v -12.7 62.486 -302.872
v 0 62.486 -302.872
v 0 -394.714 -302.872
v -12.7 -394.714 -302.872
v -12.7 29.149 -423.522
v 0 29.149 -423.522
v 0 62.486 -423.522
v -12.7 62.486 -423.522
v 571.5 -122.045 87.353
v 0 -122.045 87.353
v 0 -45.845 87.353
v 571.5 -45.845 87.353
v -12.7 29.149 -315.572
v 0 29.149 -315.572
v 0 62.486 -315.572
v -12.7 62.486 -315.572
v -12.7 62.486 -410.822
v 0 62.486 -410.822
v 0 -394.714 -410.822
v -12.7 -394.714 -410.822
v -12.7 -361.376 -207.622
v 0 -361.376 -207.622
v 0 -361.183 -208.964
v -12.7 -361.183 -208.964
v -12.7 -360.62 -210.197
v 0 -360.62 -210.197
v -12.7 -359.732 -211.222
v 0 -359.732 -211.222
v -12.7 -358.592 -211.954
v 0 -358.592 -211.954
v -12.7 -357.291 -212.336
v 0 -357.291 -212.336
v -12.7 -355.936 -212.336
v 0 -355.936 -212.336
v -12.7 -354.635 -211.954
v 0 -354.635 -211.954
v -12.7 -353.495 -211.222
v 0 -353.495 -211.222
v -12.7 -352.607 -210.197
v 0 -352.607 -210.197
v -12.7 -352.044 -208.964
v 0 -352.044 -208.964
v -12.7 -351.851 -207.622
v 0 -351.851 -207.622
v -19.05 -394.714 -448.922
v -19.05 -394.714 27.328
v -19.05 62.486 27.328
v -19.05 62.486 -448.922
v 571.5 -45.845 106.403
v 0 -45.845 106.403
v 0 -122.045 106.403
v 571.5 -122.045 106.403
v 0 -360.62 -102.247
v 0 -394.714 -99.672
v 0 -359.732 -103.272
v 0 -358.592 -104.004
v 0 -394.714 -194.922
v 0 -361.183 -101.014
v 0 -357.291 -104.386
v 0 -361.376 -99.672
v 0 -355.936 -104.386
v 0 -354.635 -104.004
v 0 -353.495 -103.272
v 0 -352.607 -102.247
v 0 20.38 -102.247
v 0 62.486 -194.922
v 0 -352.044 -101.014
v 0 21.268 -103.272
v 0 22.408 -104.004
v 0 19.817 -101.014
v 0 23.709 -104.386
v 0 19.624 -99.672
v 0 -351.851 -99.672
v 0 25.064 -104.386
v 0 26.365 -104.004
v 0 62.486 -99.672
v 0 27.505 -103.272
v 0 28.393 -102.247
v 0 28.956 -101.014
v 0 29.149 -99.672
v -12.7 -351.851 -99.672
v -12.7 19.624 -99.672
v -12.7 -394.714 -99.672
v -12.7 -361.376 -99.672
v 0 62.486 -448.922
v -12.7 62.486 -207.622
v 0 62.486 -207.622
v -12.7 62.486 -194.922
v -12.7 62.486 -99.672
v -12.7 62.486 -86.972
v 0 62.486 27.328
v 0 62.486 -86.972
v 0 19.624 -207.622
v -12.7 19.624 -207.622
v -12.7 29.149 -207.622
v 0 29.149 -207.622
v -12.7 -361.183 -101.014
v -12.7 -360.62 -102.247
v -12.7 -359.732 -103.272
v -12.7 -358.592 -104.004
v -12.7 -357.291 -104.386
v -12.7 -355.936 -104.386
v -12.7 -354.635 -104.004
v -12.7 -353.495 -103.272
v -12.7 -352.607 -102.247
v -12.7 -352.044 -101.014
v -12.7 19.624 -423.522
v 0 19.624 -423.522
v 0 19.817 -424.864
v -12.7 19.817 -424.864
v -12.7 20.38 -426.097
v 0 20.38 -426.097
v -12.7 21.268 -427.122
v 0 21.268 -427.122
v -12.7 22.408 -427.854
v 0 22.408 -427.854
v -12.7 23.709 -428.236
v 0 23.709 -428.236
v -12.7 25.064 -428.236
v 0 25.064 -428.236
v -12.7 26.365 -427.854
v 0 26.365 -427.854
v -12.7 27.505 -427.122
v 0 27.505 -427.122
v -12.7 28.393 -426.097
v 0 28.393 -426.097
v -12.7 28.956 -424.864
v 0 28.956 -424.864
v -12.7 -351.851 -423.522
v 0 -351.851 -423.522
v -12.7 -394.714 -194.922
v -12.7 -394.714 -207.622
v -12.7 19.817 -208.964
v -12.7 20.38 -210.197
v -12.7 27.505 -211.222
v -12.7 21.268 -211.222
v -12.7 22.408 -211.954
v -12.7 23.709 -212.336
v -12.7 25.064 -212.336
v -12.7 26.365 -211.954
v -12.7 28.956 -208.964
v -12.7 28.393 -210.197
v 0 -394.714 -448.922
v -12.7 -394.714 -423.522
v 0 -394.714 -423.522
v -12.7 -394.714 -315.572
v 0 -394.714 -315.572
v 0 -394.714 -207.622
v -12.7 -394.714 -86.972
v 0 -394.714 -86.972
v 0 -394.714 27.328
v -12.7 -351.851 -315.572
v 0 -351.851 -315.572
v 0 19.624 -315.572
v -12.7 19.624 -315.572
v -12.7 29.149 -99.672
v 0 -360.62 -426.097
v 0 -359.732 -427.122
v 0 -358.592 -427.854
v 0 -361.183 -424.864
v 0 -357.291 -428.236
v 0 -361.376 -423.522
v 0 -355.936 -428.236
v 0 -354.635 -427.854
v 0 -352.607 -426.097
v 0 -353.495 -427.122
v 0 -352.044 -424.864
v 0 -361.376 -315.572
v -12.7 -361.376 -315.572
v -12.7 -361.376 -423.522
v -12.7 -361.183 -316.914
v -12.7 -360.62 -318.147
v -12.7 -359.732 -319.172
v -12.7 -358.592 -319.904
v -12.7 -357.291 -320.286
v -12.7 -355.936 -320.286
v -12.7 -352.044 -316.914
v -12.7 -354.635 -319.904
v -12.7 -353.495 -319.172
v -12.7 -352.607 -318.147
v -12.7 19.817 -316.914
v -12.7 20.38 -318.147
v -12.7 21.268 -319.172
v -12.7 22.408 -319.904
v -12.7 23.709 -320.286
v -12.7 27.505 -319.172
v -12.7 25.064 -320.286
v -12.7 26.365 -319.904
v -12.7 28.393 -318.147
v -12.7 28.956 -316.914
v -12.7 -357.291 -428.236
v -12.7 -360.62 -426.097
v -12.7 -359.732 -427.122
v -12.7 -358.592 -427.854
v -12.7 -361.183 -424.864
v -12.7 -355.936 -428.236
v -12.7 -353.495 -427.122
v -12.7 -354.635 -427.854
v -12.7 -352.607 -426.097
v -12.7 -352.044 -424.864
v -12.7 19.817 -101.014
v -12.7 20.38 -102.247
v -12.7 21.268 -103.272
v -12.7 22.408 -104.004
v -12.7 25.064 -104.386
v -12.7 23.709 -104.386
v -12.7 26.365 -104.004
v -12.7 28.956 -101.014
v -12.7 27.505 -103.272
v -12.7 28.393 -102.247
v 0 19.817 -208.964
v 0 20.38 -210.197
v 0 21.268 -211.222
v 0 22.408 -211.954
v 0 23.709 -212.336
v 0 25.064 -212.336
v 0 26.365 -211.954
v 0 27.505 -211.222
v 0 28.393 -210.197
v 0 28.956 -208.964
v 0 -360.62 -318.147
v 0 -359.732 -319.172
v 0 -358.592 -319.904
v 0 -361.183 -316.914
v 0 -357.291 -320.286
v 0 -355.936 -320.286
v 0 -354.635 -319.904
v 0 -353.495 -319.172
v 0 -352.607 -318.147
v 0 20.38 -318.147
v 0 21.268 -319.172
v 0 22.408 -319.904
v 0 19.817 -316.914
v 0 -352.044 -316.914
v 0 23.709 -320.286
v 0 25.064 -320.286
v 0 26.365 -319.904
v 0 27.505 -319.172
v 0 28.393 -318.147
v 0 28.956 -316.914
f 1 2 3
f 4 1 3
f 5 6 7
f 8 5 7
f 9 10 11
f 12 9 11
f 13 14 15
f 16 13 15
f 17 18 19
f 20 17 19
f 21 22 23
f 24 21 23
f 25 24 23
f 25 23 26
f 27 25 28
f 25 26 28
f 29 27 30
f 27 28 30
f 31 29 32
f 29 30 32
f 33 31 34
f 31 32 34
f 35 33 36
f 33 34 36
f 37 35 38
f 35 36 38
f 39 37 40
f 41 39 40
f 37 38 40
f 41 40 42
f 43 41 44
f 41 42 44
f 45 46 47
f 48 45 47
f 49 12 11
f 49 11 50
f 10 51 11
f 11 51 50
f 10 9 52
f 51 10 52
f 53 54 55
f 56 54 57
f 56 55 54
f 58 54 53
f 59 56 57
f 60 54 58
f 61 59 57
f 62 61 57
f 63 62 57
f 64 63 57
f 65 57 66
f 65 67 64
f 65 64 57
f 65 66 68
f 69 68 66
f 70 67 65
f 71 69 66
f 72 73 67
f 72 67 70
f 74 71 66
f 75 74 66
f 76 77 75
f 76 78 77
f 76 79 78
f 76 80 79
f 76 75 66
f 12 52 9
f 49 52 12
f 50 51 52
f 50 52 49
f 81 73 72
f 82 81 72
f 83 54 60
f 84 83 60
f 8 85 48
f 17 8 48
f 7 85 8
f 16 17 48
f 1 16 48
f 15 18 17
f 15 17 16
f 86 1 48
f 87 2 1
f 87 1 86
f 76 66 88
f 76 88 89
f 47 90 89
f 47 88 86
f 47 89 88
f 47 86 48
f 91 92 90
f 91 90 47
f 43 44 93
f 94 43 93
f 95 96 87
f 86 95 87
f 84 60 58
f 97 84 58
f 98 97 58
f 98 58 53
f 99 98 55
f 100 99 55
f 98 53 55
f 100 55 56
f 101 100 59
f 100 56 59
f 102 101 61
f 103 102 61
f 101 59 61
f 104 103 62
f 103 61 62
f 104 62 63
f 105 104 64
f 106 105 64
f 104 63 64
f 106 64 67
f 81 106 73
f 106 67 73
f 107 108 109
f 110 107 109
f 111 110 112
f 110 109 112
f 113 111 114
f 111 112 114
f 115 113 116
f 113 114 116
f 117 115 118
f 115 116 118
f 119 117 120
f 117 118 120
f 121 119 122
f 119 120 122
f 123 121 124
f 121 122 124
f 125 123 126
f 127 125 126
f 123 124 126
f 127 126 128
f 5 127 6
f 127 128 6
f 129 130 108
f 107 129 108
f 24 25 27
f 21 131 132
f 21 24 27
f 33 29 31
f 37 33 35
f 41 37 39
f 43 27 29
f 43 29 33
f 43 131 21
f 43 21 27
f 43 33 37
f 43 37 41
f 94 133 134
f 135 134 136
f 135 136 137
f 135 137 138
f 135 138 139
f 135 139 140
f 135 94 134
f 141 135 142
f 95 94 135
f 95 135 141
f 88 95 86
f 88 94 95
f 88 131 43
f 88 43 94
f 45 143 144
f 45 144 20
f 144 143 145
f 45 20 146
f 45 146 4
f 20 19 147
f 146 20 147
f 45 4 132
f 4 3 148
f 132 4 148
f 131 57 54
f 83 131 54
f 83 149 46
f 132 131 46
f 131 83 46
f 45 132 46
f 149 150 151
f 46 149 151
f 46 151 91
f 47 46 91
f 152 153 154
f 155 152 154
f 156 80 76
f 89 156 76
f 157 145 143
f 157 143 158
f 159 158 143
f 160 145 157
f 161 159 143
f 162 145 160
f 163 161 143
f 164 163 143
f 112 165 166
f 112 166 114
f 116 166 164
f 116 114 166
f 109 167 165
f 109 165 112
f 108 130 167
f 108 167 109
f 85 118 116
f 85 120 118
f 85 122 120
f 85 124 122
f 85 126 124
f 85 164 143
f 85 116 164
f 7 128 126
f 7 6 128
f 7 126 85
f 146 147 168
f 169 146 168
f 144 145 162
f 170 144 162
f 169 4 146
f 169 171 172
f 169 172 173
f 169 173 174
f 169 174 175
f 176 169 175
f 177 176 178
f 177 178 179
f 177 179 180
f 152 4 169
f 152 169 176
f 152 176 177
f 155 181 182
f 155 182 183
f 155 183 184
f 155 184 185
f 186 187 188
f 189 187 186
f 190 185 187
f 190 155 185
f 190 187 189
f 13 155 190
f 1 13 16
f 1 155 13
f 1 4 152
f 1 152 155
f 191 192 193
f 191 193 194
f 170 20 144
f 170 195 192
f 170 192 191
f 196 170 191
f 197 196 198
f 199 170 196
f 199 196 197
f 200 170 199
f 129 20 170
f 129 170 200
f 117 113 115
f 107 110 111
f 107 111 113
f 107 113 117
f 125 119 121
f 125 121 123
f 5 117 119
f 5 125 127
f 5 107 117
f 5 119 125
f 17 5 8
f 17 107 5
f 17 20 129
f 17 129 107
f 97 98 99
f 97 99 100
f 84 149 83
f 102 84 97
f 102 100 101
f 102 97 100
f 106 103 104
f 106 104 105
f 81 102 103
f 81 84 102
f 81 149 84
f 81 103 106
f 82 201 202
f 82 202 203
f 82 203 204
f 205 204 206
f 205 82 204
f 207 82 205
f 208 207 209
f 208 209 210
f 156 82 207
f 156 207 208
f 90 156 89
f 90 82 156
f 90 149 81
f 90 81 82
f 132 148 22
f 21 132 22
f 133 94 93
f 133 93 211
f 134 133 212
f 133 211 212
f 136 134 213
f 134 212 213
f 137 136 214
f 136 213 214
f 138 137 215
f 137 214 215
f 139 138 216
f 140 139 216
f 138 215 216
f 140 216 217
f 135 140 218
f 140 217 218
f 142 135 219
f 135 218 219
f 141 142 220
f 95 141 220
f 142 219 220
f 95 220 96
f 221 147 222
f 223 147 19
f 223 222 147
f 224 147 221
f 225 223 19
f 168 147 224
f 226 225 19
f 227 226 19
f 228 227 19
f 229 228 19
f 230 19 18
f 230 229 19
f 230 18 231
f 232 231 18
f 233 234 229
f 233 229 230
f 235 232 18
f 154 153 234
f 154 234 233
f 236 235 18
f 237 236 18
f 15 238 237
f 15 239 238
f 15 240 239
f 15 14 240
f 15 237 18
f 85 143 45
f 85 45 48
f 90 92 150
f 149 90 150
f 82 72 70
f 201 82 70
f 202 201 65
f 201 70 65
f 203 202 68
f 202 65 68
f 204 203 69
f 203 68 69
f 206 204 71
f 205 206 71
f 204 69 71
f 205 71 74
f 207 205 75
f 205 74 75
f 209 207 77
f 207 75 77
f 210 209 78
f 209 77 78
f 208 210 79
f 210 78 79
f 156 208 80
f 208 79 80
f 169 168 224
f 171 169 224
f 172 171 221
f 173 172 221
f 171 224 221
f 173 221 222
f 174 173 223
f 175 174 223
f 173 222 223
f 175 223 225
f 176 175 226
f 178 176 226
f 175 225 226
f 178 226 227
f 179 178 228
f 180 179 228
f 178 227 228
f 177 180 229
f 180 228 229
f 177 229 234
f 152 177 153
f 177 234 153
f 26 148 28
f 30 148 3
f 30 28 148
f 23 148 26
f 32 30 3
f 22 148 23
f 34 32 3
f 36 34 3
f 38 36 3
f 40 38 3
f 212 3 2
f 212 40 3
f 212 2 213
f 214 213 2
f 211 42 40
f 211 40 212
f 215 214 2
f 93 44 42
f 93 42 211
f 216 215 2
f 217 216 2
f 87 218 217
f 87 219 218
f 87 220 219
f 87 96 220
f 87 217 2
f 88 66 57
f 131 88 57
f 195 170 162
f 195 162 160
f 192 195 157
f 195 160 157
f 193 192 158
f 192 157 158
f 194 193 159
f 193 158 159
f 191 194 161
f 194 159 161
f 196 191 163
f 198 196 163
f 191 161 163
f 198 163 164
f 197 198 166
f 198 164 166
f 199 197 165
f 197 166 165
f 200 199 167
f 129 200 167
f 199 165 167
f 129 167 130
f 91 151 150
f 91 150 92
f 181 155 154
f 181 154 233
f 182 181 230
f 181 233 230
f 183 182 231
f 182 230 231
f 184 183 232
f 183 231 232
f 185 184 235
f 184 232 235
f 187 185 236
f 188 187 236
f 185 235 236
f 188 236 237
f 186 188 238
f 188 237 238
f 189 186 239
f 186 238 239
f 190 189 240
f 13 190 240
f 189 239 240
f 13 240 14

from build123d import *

# Parameters (mm, degrees)
F0_W     = 457.2
F0_H     = 476.25
F2_DEPTH = 19.05
F3_DEPTH = 12.7
F4_DEPTH = 12.7
F5_W     = 76.2
F5_H     = 19.05
F6_DEPTH = 571.5


# Not quite as in the source:
# - a feature names something its author has since deleted; it is built from what else it names


with BuildPart() as f2:
    # F0 (on Right) → F2 (new body)
    with BuildSketch(Plane.YZ):
        with Locations((-166.1135266319, -210.7972649872)):
            Rectangle(F0_W, F0_H)
    extrude(amount=-F2_DEPTH)

    # F1 (on face) → F3 (cut)
    with BuildSketch(Plane.YZ):
        with BuildLine():
            Line((-394.7135266319, -410.8222649872), (-394.7135266319, -423.5222649872))
            Line((-394.7135266319, -423.5222649872), (-361.3760266319, -423.5222649872))
            ThreePointArc((-361.3760266319, -423.5222649872), (-356.6135266319, -428.2847649872), (-351.8510266319, -423.5222649872))
            Line((-351.8510266319, -423.5222649872), (19.6239733681, -423.5222649872))
            ThreePointArc((19.6239733681, -423.5222649872), (24.3864733681, -428.2847649872), (29.1489733681, -423.5222649872))
            Line((29.1489733681, -423.5222649872), (62.4864733681, -423.5222649872))
            Line((62.4864733681, -423.5222649872), (62.4864733681, -410.8222649872))
            Line((62.4864733681, -410.8222649872), (-394.7135266319, -410.8222649872))
        make_face()
    extrude(amount=-F3_DEPTH, mode=Mode.SUBTRACT)

    # F1 (on face) → F4 (cut)
    with BuildSketch(Plane.YZ):
        with BuildLine():
            Line((-394.7135266319, -302.8722649872), (-394.7135266319, -315.5722649872))
            Line((-394.7135266319, -315.5722649872), (-361.3760266319, -315.5722649872))
            ThreePointArc((-361.3760266319, -315.5722649872), (-356.6135266319, -320.3347649872), (-351.8510266319, -315.5722649872))
            Line((-351.8510266319, -315.5722649872), (19.6239733681, -315.5722649872))
            ThreePointArc((19.6239733681, -315.5722649872), (24.3864733681, -320.3347649872), (29.1489733681, -315.5722649872))
            Line((29.1489733681, -315.5722649872), (62.4864733681, -315.5722649872))
            Line((62.4864733681, -315.5722649872), (62.4864733681, -302.8722649872))
            Line((62.4864733681, -302.8722649872), (-394.7135266319, -302.8722649872))
        make_face()
        with BuildLine():
            Line((-394.7135266319, -194.9222649872), (-394.7135266319, -207.6222649872))
            Line((-394.7135266319, -207.6222649872), (-361.3760266319, -207.6222649872))
            ThreePointArc((-361.3760266319, -207.6222649872), (-356.6135266319, -212.3847649872), (-351.8510266319, -207.6222649872))
            Line((-351.8510266319, -207.6222649872), (19.6239733681, -207.6222649872))
            ThreePointArc((19.6239733681, -207.6222649872), (24.3864733681, -212.3847649872), (29.1489733681, -207.6222649872))
            Line((29.1489733681, -207.6222649872), (62.4864733681, -207.6222649872))
            Line((62.4864733681, -207.6222649872), (62.4864733681, -194.9222649872))
            Line((62.4864733681, -194.9222649872), (-394.7135266319, -194.9222649872))
        make_face()
        with BuildLine():
            Line((-394.7135266319, -86.9722649872), (-394.7135266319, -99.6722649872))
            Line((-394.7135266319, -99.6722649872), (-361.3760266319, -99.6722649872))
            ThreePointArc((-361.3760266319, -99.6722649872), (-356.6135266319, -104.4347649872), (-351.8510266319, -99.6722649872))
            Line((-351.8510266319, -99.6722649872), (19.6239733681, -99.6722649872))
            ThreePointArc((19.6239733681, -99.6722649872), (24.3864733681, -104.4347649872), (29.1489733681, -99.6722649872))
            Line((29.1489733681, -99.6722649872), (62.4864733681, -99.6722649872))
            Line((62.4864733681, -99.6722649872), (62.4864733681, -86.9722649872))
            Line((62.4864733681, -86.9722649872), (-394.7135266319, -86.9722649872))
        make_face()
    extrude(amount=-F4_DEPTH, mode=Mode.SUBTRACT)


with BuildPart() as f6:
    # F5 (on Right) → F6 (new body)
    with BuildSketch(Plane.YZ):
        with Locations((-83.9446932077, 96.8780869972)):
            Rectangle(F5_W, F5_H)
    extrude(amount=F6_DEPTH)


solid = Compound([f2.part, f6.part])
